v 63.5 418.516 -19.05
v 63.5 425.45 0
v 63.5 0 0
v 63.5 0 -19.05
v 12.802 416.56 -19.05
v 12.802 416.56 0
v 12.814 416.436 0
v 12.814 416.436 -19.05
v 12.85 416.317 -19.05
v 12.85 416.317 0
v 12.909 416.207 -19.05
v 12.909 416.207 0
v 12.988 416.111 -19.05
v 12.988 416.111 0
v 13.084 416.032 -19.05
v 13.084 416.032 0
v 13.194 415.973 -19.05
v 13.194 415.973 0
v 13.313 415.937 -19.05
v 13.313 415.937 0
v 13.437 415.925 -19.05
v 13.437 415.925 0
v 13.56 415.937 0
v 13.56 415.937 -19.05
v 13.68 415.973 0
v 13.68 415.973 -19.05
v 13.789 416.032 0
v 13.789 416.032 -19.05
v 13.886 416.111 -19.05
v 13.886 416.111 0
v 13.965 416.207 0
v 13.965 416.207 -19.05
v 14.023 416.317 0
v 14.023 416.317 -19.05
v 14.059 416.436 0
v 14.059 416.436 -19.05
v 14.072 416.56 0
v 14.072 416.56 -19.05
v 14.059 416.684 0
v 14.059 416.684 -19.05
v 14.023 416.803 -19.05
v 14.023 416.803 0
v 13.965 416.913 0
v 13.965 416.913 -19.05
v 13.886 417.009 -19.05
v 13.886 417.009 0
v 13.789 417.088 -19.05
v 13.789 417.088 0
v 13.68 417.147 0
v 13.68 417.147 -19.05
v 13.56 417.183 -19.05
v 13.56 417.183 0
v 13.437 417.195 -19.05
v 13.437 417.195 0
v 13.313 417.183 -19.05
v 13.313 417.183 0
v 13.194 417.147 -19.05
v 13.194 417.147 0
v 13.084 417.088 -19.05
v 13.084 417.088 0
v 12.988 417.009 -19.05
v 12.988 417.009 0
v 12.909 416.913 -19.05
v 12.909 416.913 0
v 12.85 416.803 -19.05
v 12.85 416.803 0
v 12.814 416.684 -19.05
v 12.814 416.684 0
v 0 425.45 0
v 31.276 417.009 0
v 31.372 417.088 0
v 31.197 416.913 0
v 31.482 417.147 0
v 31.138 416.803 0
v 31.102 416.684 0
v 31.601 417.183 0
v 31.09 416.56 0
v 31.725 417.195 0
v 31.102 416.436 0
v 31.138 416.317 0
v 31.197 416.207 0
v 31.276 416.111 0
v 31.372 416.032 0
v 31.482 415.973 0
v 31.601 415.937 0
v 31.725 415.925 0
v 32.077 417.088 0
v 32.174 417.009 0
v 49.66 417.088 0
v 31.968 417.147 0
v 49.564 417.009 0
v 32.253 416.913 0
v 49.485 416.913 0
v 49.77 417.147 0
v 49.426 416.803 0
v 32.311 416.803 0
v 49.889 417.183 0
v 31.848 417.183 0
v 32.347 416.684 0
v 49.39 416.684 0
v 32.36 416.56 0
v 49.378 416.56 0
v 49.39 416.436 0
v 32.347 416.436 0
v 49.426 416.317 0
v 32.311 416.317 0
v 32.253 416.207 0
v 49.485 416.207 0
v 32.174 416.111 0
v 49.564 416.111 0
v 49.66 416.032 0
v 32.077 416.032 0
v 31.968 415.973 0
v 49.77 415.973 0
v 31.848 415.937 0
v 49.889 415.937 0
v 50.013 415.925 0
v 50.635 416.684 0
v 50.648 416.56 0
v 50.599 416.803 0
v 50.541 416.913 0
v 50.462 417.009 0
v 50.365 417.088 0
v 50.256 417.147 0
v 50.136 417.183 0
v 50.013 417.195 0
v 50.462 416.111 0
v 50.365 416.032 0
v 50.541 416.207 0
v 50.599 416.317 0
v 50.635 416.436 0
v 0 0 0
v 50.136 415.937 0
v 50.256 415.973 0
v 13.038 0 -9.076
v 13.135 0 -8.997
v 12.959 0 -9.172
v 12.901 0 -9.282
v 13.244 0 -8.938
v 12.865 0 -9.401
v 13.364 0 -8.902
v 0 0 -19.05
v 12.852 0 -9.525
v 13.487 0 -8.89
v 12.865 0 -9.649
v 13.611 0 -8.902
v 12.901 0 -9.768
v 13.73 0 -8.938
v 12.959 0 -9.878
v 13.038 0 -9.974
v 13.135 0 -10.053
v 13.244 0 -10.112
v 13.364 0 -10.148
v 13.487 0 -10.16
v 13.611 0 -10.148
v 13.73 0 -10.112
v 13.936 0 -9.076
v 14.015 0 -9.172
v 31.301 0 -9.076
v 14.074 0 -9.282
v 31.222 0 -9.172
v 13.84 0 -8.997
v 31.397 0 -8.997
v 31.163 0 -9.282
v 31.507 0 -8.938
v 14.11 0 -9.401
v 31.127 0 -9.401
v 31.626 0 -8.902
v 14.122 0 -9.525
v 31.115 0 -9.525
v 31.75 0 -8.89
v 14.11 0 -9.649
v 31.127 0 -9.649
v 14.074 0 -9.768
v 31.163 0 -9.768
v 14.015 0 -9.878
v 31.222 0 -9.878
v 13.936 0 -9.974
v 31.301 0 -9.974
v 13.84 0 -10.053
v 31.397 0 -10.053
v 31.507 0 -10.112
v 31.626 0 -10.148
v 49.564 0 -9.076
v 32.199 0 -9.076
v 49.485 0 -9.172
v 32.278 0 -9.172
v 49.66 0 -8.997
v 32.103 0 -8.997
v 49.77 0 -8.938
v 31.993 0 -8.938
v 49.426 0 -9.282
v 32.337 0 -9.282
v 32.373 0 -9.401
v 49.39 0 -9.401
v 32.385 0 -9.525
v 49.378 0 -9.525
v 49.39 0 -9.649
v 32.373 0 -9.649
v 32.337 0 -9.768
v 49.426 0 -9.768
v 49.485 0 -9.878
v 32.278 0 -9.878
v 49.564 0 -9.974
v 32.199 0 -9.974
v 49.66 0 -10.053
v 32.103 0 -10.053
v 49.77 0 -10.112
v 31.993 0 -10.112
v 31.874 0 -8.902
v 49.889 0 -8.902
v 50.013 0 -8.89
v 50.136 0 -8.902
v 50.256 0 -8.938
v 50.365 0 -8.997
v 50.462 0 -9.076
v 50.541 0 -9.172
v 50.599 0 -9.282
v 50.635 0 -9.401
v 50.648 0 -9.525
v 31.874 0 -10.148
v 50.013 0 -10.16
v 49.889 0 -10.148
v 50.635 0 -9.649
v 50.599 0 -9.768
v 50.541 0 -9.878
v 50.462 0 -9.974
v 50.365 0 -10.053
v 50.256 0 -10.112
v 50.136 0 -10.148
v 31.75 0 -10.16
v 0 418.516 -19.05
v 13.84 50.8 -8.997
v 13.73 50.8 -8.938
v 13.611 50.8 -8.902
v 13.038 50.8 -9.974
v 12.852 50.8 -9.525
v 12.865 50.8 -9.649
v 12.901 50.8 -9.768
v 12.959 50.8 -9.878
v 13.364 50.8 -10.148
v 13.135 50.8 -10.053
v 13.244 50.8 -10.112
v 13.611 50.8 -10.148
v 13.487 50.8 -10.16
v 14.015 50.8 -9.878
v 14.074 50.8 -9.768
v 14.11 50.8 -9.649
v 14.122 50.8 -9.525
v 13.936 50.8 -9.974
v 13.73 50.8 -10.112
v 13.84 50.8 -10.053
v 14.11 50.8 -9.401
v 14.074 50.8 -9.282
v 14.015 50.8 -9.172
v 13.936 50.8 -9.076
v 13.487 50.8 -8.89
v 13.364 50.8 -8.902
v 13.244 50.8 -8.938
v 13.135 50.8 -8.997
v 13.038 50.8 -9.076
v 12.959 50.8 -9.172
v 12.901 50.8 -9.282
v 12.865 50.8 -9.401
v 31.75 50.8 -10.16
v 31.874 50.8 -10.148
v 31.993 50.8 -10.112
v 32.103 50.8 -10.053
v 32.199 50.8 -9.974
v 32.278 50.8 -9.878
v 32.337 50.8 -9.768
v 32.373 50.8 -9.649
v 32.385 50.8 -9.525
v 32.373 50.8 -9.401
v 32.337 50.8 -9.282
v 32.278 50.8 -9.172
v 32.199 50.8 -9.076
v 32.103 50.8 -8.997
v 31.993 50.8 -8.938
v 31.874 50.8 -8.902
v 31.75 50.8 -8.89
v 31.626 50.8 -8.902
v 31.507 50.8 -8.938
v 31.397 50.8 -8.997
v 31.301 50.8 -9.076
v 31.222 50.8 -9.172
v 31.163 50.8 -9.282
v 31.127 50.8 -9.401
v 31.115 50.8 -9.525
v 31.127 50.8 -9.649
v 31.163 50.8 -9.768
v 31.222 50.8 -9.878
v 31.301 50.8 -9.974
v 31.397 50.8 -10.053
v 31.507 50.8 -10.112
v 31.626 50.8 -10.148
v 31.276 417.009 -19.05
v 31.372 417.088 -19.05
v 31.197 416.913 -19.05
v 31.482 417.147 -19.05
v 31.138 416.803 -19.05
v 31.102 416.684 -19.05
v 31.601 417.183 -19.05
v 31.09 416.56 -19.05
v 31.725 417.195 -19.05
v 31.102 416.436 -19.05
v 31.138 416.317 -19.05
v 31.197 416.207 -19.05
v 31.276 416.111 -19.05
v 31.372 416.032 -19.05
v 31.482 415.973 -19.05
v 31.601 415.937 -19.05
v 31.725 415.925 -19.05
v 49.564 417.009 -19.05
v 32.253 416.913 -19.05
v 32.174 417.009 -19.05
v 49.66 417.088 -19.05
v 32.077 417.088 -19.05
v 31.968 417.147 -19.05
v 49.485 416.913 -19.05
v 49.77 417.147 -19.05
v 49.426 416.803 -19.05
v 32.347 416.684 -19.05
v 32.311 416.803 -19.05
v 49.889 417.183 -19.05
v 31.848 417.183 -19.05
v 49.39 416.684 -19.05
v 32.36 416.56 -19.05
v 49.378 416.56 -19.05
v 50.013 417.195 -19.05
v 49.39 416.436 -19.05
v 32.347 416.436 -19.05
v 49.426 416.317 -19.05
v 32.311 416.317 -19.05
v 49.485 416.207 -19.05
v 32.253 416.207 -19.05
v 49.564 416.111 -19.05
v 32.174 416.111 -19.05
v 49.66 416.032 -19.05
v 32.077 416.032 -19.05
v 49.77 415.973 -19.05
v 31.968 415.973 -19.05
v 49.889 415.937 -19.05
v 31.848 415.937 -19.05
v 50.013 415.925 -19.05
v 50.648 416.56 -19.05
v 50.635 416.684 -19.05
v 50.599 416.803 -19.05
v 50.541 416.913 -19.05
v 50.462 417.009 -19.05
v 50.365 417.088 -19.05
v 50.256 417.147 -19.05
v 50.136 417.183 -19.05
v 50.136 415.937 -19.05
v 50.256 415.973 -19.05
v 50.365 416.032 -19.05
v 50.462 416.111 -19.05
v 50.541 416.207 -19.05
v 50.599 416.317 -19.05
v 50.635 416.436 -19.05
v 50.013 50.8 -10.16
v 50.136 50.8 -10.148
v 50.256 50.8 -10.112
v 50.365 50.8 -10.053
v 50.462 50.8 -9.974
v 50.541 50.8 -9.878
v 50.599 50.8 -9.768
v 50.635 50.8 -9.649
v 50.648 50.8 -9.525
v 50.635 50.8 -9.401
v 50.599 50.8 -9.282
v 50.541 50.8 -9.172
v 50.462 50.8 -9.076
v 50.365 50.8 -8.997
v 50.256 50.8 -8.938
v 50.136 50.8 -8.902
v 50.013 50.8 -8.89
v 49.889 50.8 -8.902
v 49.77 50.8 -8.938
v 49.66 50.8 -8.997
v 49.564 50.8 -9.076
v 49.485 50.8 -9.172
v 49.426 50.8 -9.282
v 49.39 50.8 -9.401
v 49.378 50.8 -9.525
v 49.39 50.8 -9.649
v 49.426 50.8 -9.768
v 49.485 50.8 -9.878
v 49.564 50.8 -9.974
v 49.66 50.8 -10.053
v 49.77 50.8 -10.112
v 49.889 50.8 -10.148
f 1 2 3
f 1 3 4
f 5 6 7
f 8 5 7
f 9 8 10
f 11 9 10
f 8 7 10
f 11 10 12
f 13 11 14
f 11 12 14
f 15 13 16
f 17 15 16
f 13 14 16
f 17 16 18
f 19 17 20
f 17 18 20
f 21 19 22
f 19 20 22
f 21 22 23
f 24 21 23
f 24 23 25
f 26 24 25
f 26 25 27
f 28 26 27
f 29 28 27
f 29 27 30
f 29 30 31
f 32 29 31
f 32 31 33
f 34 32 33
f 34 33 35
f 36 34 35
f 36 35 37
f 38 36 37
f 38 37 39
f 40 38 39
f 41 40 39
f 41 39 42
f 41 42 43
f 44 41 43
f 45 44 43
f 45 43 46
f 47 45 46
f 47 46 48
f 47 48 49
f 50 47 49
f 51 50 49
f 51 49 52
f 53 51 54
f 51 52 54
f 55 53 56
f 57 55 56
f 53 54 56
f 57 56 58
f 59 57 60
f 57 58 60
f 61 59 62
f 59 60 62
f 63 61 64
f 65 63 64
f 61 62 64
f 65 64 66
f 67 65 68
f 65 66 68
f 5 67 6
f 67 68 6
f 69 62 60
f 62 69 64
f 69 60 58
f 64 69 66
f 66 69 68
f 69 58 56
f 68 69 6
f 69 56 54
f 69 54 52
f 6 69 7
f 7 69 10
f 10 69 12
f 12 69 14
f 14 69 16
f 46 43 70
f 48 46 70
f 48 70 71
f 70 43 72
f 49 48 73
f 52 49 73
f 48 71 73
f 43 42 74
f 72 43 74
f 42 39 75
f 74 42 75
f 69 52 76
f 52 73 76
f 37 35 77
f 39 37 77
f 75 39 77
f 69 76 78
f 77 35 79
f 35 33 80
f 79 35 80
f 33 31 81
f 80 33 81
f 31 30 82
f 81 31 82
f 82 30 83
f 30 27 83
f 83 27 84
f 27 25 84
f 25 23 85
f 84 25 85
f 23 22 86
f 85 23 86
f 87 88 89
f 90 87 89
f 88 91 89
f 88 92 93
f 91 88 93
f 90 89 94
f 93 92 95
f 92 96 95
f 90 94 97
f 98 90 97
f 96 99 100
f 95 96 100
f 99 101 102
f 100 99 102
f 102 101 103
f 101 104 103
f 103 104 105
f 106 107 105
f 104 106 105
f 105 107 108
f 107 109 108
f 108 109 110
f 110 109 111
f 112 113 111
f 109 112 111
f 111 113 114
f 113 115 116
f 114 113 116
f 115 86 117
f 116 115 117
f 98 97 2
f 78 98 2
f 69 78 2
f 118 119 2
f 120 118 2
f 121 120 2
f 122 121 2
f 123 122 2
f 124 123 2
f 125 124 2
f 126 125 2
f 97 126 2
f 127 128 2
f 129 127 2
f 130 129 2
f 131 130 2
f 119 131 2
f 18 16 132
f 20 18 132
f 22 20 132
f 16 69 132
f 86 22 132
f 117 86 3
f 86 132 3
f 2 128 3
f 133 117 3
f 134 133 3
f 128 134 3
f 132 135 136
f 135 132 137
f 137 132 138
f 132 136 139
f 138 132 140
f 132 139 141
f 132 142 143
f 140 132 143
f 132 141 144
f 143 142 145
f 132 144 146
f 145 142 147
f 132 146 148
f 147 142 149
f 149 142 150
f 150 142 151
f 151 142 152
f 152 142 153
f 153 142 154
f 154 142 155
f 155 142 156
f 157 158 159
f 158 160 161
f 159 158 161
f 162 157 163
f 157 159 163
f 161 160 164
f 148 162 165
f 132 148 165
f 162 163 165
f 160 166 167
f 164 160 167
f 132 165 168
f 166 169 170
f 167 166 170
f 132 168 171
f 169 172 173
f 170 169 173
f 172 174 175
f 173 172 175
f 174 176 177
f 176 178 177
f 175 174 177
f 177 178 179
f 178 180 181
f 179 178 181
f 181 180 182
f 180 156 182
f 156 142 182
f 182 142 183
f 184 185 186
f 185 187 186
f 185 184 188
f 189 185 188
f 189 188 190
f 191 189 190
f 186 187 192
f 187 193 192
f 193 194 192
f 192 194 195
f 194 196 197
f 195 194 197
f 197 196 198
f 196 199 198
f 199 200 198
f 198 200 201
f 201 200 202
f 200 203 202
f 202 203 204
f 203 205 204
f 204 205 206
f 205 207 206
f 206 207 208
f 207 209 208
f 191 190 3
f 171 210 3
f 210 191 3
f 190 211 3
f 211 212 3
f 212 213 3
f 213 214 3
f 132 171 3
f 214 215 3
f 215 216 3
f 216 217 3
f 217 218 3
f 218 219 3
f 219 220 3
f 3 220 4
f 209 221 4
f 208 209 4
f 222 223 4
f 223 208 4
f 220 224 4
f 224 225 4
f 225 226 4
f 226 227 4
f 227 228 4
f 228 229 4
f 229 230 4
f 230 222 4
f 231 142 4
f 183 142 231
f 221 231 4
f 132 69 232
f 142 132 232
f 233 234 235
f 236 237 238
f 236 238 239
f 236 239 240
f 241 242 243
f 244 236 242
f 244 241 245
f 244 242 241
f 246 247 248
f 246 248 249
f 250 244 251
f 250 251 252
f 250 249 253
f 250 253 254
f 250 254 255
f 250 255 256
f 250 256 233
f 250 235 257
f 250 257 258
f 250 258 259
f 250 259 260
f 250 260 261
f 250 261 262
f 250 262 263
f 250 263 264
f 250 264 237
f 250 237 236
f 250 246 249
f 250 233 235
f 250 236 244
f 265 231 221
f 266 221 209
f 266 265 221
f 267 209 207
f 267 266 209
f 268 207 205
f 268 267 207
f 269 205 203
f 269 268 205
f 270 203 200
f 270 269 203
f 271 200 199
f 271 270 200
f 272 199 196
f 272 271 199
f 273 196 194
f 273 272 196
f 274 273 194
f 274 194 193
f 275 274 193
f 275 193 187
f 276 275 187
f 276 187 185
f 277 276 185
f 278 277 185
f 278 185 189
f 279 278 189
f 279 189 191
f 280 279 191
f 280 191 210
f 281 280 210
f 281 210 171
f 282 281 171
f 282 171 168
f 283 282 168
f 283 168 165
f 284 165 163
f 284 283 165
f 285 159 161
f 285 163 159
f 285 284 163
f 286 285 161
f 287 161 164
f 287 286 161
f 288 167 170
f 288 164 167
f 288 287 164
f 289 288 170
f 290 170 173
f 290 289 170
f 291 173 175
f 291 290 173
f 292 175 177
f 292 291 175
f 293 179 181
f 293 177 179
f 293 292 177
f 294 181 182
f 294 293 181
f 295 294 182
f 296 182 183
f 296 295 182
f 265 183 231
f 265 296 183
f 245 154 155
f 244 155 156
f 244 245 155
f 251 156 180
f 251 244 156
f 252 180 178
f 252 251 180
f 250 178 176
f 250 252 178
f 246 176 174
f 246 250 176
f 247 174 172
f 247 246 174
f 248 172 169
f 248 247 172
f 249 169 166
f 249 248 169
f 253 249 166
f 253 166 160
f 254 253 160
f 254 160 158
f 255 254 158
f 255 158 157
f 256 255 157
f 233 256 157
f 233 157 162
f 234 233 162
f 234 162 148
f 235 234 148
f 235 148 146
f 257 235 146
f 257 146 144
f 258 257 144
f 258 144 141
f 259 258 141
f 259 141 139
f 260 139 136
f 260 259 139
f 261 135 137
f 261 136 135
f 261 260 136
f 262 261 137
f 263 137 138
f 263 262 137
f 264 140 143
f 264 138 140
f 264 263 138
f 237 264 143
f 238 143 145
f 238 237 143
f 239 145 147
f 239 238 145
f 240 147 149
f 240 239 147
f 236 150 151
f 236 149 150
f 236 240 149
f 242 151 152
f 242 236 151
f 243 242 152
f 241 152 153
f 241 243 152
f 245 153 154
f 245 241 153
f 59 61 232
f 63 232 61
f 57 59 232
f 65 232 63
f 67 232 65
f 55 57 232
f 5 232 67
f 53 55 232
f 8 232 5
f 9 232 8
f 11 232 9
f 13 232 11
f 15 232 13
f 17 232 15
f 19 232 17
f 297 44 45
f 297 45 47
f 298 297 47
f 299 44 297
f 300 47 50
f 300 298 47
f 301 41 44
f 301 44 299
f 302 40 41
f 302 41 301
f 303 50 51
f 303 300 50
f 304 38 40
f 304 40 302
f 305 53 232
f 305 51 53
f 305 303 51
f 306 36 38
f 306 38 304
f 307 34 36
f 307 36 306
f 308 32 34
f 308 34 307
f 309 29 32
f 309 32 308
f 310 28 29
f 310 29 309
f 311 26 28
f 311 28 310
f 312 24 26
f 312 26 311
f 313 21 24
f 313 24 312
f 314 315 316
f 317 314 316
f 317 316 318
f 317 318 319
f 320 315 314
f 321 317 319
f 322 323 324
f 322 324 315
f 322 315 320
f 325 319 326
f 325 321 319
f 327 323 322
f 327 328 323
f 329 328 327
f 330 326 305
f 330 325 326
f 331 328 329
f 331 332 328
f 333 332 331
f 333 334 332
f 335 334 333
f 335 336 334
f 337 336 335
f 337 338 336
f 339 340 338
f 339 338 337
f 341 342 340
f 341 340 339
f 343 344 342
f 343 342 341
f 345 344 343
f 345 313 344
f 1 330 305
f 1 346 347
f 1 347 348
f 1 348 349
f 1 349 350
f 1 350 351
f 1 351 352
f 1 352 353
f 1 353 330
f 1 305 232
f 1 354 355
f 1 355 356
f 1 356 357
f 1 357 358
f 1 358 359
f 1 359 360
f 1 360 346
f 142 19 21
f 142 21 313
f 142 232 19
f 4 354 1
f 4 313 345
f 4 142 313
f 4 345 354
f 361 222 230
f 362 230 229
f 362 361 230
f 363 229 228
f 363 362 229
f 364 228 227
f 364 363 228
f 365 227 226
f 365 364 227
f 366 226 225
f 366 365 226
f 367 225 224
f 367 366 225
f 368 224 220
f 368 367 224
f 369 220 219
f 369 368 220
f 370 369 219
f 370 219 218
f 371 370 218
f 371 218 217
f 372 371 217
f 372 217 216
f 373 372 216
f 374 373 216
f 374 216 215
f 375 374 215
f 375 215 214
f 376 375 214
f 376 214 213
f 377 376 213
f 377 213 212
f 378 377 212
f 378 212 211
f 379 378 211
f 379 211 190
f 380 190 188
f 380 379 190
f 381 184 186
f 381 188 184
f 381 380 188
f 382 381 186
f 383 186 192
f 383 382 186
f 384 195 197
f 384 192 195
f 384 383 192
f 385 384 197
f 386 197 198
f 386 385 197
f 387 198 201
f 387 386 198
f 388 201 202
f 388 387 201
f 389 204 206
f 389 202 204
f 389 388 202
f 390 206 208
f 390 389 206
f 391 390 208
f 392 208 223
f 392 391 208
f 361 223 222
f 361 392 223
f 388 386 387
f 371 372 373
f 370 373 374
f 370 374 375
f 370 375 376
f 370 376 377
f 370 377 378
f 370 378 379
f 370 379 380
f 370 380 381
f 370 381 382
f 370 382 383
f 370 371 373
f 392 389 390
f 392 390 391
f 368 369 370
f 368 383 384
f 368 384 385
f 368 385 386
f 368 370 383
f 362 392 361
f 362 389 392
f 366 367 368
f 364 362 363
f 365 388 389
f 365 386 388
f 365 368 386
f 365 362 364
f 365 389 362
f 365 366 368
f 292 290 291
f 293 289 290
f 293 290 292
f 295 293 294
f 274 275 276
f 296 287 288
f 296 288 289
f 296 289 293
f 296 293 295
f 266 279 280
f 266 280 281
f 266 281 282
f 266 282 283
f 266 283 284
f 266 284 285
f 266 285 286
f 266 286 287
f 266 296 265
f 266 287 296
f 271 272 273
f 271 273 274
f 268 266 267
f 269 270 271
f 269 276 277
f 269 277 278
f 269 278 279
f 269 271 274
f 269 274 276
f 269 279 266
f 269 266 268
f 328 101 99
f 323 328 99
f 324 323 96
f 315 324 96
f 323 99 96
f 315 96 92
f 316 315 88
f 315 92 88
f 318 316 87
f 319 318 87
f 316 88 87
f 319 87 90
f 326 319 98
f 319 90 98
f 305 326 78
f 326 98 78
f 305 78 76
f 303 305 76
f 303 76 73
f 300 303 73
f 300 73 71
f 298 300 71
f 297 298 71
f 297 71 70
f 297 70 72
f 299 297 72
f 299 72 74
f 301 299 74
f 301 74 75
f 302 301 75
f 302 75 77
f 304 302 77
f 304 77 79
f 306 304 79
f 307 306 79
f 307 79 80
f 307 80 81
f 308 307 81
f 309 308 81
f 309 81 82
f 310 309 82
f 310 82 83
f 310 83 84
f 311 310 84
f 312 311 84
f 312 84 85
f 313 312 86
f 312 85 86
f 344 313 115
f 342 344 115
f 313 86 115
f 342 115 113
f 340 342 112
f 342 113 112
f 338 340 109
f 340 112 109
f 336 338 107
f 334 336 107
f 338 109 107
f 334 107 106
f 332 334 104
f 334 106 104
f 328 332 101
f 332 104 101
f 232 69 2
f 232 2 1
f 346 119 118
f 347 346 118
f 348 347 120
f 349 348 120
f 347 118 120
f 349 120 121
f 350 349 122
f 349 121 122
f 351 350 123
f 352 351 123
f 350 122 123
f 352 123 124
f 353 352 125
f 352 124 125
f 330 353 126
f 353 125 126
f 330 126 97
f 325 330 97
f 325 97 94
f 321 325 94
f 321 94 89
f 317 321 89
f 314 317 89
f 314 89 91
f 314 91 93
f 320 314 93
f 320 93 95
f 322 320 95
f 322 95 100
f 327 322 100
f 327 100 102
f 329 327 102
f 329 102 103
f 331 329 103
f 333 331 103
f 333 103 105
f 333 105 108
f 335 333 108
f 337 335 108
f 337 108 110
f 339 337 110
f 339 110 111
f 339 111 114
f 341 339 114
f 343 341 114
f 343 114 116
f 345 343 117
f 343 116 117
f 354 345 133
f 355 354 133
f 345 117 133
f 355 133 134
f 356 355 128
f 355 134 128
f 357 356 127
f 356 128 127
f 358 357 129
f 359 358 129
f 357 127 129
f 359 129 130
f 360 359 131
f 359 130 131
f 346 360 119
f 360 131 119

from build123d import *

# Parameters (mm, degrees)
SKETCH2_W               = 63.5
SKETCH2_H               = 19.05
BOSS_EXTRUDE1_DEPTH     = 425.45
CUT_EXTRUDE1_DEPTH      = 431.584318107
CUT_EXTRUDE1_DEPTH_BACK = 50.8
SKETCH3_R               = 0.635
SKETCH4_R               = 0.635
CUT_EXTRUDE2_DEPTH      = 431.584318107
CUT_EXTRUDE3_DEPTH      = 431.584318107


with BuildPart() as part:
    # Sketch2 → Boss-Extrude1 (new body)
    with BuildSketch(Plane(origin=(0, 0, 0), x_dir=(1, 0, 0), z_dir=(0, 1, 0))):
        with Locations((31.75, 9.525)):
            Rectangle(SKETCH2_W, SKETCH2_H)
    extrude(amount=BOSS_EXTRUDE1_DEPTH)

    # Sketch3 → Cut-Extrude1 (cut, two sides: drawn at the far end of the back side and taken through both)
    with BuildSketch(Plane.XZ.offset(-CUT_EXTRUDE1_DEPTH_BACK)):
        with Locations(Location((13.487400071, -9.524999694, 0), (0, 0, 270))):
            Circle(SKETCH3_R)
        with Locations(Location((31.750000071, -9.524999694, 0), (0, 0, 270))):
            Circle(SKETCH3_R)
        with Locations(Location((50.012600071, -9.524999694, 0), (0, 0, 270))):
            Circle(SKETCH3_R)
    extrude(amount=CUT_EXTRUDE1_DEPTH + CUT_EXTRUDE1_DEPTH_BACK, mode=Mode.SUBTRACT)

    # Sketch4 → Cut-Extrude2 (cut, through all)
    with BuildSketch(Plane.XY):
        with Locations((31.724600071, 416.56)):
            Circle(SKETCH4_R)
        with Locations((50.012600071, 416.56)):
            Circle(SKETCH4_R)
        with Locations(Location((13.436600071, 416.56, 0), (0, 0, 180))):
            Circle(SKETCH4_R)
    extrude(amount=-CUT_EXTRUDE2_DEPTH, mode=Mode.SUBTRACT)

    # Sketch5 → Cut-Extrude3 (cut, through all)
    with BuildSketch(Plane.ZY):
        Polygon((0, 425.45), (-19.05, 418.516367037), (-19.05, 425.45), align=None)
    extrude(amount=-CUT_EXTRUDE3_DEPTH, mode=Mode.SUBTRACT)


solid = part.part
